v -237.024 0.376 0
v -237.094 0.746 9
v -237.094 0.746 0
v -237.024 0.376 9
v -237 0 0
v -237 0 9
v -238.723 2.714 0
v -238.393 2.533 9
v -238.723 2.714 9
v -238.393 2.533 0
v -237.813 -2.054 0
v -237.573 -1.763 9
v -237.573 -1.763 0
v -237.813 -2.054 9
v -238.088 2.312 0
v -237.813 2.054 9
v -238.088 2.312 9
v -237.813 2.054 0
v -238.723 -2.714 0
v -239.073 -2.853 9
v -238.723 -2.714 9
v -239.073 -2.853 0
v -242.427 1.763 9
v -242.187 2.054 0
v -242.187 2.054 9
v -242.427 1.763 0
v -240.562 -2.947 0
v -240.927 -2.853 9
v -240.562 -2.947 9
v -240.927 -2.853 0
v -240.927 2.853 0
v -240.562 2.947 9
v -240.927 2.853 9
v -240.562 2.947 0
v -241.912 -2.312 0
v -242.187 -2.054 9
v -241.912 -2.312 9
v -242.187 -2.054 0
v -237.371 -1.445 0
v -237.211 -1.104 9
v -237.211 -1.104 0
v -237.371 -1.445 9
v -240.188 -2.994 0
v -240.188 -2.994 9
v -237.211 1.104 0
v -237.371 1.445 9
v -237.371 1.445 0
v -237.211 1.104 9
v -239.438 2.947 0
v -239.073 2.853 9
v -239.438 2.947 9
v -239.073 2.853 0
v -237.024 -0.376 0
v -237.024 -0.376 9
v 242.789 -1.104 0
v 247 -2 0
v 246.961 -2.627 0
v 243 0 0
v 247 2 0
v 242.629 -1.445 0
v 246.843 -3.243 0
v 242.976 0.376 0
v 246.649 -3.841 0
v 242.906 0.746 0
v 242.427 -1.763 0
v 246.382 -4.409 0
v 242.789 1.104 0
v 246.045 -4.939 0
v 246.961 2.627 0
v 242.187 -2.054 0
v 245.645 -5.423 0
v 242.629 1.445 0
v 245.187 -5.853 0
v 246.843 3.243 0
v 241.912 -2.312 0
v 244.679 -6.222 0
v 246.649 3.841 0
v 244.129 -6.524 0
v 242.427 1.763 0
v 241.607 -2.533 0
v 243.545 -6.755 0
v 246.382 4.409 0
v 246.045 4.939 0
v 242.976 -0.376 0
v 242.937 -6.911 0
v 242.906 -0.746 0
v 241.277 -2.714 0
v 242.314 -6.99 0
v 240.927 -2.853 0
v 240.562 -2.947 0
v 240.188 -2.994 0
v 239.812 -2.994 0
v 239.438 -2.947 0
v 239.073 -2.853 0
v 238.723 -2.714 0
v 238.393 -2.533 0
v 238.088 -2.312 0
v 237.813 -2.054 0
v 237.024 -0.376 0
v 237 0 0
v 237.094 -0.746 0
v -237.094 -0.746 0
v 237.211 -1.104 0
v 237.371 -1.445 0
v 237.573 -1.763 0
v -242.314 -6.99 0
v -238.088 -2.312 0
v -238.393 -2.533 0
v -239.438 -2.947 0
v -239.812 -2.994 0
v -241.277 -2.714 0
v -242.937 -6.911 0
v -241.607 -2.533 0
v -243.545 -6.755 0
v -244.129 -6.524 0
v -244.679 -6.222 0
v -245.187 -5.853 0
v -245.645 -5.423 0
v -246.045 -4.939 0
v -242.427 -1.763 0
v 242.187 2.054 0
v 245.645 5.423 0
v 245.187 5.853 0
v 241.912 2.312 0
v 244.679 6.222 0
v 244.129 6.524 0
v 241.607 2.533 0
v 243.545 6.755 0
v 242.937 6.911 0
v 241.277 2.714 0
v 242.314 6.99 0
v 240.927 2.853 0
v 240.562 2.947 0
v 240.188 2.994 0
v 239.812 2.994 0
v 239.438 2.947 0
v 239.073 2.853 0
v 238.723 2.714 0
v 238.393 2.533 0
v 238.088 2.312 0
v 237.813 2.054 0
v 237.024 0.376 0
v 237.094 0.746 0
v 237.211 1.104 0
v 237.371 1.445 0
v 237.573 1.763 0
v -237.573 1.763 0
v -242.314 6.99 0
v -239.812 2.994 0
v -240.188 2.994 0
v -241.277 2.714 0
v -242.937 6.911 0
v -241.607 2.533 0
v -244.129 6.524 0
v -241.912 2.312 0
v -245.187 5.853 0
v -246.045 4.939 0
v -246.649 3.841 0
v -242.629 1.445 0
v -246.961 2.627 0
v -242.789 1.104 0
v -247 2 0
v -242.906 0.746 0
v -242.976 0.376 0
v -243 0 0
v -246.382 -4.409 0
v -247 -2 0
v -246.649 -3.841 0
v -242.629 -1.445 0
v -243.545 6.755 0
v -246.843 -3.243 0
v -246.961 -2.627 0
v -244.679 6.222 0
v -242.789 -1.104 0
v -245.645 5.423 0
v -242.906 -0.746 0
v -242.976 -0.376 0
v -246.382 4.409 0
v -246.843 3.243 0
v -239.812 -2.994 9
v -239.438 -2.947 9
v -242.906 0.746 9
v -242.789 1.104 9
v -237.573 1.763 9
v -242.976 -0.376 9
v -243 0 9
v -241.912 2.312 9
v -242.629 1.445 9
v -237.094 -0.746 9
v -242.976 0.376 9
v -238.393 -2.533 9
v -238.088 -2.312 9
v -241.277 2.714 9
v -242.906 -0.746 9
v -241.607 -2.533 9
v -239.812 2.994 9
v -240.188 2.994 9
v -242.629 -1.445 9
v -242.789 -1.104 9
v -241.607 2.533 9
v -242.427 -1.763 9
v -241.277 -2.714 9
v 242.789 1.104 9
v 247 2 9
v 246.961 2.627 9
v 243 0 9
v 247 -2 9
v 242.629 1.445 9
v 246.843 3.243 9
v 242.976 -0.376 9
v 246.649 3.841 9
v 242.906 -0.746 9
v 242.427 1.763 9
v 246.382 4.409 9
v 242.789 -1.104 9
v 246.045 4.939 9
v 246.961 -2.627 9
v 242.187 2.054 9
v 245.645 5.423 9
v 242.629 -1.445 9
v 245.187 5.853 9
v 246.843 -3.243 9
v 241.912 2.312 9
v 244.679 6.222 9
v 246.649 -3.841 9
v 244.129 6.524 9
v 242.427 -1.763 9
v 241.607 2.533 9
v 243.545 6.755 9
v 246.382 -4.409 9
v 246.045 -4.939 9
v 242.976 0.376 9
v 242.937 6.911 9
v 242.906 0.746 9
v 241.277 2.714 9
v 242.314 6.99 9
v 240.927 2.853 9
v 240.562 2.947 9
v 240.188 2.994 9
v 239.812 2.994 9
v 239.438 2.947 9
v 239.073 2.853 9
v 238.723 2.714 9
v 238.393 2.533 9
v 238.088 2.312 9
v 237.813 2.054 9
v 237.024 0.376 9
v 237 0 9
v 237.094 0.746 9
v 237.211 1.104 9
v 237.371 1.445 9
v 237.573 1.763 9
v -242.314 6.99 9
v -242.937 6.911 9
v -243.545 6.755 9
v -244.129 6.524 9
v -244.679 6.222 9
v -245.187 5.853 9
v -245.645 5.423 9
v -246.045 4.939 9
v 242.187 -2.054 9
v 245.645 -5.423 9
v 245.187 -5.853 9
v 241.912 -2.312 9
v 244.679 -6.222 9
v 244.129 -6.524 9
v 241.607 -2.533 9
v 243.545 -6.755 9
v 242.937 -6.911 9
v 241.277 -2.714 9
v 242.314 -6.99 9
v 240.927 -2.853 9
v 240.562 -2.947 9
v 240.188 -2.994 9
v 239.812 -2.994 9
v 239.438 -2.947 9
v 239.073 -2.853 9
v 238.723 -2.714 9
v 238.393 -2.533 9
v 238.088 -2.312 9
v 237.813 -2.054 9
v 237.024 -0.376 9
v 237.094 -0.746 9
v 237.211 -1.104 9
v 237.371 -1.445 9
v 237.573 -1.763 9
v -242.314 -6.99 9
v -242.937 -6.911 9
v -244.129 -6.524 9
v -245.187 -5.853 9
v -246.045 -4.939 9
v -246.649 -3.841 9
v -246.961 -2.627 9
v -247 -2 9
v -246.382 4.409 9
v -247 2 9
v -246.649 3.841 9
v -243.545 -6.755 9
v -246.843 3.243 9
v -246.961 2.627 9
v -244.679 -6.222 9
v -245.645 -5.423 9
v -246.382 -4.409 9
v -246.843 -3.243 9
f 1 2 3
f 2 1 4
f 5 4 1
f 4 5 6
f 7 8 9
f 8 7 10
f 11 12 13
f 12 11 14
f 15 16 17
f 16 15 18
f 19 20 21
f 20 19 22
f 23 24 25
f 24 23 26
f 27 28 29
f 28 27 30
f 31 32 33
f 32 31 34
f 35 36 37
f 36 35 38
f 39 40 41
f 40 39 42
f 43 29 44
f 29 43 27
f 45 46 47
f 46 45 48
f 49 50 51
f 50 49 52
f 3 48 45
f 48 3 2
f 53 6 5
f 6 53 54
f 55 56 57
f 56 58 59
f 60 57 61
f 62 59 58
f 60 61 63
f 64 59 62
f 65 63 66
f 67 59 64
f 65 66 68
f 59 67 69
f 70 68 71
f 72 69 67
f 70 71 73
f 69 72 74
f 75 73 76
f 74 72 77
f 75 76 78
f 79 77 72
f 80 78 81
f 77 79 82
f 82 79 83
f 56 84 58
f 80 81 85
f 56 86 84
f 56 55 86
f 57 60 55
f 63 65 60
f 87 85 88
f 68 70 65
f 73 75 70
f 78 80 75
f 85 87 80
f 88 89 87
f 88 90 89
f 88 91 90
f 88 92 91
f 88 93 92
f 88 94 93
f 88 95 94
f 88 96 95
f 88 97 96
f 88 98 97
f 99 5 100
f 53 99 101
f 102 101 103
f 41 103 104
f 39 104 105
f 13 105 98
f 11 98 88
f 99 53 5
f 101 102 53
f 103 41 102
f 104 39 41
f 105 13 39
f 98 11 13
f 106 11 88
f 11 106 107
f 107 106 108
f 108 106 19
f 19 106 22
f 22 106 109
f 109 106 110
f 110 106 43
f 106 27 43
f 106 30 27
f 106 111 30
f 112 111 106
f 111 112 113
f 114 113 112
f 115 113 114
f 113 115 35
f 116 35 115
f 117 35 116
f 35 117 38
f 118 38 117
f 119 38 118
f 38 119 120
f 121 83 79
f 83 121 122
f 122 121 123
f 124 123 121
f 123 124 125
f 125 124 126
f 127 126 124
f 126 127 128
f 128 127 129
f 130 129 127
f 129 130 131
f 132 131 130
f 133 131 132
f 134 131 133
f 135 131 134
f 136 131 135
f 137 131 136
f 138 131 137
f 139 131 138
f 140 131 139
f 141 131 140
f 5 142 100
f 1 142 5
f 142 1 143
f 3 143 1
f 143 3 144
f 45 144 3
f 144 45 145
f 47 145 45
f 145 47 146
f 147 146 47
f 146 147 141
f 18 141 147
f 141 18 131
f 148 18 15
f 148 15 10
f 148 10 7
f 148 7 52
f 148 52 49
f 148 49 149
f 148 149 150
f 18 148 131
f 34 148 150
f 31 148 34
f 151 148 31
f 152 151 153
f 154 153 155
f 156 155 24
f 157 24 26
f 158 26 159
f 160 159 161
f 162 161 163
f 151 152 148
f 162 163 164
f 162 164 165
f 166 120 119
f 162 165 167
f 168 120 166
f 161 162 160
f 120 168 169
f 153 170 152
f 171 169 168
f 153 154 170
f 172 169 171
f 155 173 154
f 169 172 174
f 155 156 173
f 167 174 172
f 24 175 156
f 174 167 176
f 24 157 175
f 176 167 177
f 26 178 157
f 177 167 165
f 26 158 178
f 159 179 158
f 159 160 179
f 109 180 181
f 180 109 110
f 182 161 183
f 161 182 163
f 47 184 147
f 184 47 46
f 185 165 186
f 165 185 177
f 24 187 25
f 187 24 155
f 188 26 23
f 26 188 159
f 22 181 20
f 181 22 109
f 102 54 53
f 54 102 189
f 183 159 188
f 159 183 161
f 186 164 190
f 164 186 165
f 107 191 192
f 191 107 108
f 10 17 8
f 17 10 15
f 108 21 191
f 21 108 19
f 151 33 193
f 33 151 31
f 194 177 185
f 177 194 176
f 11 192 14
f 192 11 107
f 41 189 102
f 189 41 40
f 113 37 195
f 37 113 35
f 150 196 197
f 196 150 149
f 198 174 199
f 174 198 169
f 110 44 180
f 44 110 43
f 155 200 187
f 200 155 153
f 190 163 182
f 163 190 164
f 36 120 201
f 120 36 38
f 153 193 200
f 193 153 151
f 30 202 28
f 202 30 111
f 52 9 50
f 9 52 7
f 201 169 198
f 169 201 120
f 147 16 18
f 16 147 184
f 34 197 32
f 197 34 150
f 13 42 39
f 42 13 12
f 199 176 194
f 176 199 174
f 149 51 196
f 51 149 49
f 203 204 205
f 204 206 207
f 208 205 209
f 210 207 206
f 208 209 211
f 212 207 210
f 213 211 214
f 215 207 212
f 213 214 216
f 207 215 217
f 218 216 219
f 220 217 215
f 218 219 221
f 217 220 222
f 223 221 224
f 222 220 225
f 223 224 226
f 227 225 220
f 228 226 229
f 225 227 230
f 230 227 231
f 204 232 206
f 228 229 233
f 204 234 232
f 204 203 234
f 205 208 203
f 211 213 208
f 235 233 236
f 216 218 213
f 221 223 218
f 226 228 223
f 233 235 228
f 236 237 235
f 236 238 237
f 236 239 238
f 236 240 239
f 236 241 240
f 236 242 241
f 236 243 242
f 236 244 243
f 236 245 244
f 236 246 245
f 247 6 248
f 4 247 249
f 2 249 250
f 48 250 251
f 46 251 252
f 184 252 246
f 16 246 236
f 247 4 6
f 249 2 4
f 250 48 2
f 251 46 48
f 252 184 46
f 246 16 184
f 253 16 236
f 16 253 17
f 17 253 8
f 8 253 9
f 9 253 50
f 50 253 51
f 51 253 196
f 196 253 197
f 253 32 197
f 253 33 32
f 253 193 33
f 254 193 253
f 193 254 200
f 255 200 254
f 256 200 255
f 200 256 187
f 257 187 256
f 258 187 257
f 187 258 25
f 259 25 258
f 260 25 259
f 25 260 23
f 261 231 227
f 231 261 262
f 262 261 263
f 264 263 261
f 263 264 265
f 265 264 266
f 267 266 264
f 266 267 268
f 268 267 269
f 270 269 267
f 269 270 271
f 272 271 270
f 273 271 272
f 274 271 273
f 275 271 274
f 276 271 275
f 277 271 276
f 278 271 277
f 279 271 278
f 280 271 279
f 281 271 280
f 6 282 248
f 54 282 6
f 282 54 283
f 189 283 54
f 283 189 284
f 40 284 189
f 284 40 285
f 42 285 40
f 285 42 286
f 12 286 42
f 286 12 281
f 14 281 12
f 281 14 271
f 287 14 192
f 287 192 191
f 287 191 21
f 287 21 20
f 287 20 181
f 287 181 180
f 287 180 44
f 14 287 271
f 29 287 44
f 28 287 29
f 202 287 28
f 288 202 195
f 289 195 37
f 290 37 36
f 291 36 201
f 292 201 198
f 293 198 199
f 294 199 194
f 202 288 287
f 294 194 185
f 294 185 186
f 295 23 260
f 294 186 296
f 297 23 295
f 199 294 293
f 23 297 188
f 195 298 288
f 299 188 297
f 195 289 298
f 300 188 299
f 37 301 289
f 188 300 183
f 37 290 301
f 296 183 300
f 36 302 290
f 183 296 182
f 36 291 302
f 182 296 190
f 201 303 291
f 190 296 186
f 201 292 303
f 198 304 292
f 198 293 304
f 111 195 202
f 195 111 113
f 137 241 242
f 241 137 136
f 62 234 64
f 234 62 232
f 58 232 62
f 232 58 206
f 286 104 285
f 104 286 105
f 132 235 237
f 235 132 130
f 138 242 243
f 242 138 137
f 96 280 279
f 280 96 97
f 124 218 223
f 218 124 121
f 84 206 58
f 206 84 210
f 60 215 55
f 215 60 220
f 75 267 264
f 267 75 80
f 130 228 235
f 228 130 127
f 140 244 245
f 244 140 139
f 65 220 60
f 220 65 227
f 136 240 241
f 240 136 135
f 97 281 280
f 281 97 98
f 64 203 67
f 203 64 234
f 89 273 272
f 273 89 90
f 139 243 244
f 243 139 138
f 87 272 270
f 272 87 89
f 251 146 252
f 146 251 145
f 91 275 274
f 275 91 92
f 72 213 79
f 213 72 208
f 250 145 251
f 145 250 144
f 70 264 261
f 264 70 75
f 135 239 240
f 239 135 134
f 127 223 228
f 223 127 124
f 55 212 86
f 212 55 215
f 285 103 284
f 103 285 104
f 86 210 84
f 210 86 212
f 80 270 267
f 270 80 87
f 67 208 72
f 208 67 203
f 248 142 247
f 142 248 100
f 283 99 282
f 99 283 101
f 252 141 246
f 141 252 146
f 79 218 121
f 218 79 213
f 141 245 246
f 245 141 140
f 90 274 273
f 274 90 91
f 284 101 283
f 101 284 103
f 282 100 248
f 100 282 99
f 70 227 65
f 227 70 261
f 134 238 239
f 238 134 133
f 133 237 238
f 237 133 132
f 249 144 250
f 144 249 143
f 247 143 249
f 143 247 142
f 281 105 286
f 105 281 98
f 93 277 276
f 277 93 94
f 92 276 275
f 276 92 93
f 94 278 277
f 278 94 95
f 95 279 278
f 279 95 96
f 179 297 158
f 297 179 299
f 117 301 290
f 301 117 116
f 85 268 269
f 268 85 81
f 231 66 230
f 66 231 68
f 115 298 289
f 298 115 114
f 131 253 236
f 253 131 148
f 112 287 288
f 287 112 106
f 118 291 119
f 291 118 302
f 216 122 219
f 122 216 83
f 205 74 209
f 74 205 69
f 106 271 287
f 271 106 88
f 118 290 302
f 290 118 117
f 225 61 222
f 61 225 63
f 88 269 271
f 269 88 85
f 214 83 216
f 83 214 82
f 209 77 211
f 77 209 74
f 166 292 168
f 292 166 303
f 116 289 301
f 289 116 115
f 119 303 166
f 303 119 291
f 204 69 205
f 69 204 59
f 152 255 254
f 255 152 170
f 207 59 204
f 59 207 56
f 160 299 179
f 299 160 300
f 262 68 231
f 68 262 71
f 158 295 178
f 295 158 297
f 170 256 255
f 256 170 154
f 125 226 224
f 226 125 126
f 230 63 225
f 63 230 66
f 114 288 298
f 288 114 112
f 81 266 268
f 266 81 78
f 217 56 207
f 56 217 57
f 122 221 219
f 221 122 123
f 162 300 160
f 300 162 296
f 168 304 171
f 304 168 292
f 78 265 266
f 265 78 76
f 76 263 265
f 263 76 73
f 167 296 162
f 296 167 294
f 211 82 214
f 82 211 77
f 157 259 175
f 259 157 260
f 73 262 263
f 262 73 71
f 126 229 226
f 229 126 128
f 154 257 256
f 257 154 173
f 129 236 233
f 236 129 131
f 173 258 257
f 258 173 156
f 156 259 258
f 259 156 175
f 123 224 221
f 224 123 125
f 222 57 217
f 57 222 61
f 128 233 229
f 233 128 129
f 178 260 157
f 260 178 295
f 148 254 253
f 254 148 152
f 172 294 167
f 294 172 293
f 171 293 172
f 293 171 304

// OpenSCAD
$fn = 50;


difference() {
	union() {
		hull() {
			translate(v = [-242.0000000000, 2.0000000000, 0]) {
				cylinder(h = 9, r = 5);
			}
			translate(v = [242.0000000000, 2.0000000000, 0]) {
				cylinder(h = 9, r = 5);
			}
			translate(v = [-242.0000000000, -2.0000000000, 0]) {
				cylinder(h = 9, r = 5);
			}
			translate(v = [242.0000000000, -2.0000000000, 0]) {
				cylinder(h = 9, r = 5);
			}
		}
	}
	union() {
		translate(v = [-240.0000000000, 0.0000000000, 0]) {
			cylinder(h = 9, r = 3.0000000000);
		}
		translate(v = [240.0000000000, 0.0000000000, 0]) {
			cylinder(h = 9, r = 3.0000000000);
		}
		translate(v = [-240.0000000000, 0.0000000000, 0]) {
			cylinder(h = 9, r = 1.5000000000);
		}
		translate(v = [240.0000000000, 0.0000000000, 0]) {
			cylinder(h = 9, r = 1.5000000000);
		}
		translate(v = [-240.0000000000, 0.0000000000, 0]) {
			cylinder(h = 9, r = 1.5000000000);
		}
		translate(v = [240.0000000000, 0.0000000000, 0]) {
			cylinder(h = 9, r = 1.5000000000);
		}
		translate(v = [-240.0000000000, 0.0000000000, 0]) {
			cylinder(h = 9, r = 1.5000000000);
		}
		translate(v = [240.0000000000, 0.0000000000, 0]) {
			cylinder(h = 9, r = 1.5000000000);
		}
	}
}
